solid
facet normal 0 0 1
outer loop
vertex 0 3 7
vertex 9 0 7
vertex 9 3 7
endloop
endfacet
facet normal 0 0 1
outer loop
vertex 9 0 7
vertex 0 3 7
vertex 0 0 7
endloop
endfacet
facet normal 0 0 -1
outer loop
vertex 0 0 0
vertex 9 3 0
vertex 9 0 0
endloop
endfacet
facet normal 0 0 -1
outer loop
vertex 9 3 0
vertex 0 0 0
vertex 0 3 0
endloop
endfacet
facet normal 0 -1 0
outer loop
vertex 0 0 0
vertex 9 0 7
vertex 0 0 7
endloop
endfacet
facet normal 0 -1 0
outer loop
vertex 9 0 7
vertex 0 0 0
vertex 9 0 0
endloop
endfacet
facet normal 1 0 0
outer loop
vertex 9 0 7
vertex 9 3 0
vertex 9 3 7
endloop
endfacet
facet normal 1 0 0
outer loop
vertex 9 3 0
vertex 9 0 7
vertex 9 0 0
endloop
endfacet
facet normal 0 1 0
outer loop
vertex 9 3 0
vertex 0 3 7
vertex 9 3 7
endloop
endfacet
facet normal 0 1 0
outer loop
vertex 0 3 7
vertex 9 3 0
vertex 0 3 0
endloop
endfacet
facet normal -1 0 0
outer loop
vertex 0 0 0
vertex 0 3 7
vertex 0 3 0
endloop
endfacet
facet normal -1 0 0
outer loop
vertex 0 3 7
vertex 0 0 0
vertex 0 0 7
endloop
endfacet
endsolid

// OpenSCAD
// Generated by SolidPython 1.0.1 on 2020-07-29 00:46:55


cube(size = [9, 3, 7]);
/***********************************************
*********      SolidPython code:      **********
************************************************
 
# import packages: SolidPython
from solid import *
from solid.utils import *
from itertools import chain, combinations, permutations


class Resize:

    def __init__(self, scad_file):
        self.scad_file = scad_file
        #self.scad_file = import_scad(scad_file)
        # cone/cylinder param:
        self.r1 = 0
        self.r2 = 0
        self.h = 0
        # rectangular prism param:
        self.w = 0
        self.l = 0
        # ellipse param:
        self.r = 0

    # import OpenScad code (file name corresponds to shape)


    # classify shape + parameters
    def assign(self, param1, param2, param3):
        if self.scad_file == 'cone.scad':
            self.r1 = param1
            self.r2 = param2
            self.h = param3
        elif self.scad_file == 'cylinder.scad':
            self.r1 = param1
            self.r2 = param2
            self.h = param3
        elif self.scad_file == 'rectangularPrism.scad':
            self.h = param1
            self.l = param2
            self.w = param3
        else:
            self.r = param1
            self.h = param2

    # resize parameters
    def iterate(self):
        x = range(3, 20, 2)
        i = 1
        if self.scad_file == 'cone.scad':
            tempList = list(permutations(x, 2))
            for temp in tempList:
                param1 = temp[0]
                param2 = temp[1]
                filepath = 'produced_scad_files/' + 'cone' + str(param1) + '_' + str(param2) + '_' + '.scad'
                scad_render_to_file(cylinder(h=param1, r1=param2, r2=0), filepath)

        elif self.scad_file == 'cylinder.scad':
            tempList = list(permutations(x, 3))
            for temp in tempList:
                param1 = temp[0]
                param2 = temp[1]
                filepath = 'produced_scad_files/' + 'cylinder' + str(param1) + '_' + str(param2) + '_' + '.scad'
                scad_render_to_file(cylinder(h=param1, r1=param2, r2=param2), filepath)

        elif self.scad_file == 'rectangularPrism.scad':
            tempList = list(permutations(x, 3))
            for temp in tempList:
                param1 = temp[0]
                param2 = temp[1]
                param3 = temp[2]
                filepath = 'produced_scad_files/' + 'rectangularPrism' + str(param1) + '_' + str(param2) + '_' + str(
                    param3) + '.scad'
                scad_render_to_file(cube(size=(param1, param2, param3)), filepath)

        elif self.scad_file == 'ellipse.scad':
            tempList = list(permutations(x, 4))
            for temp in tempList:
                param1 = temp[0]
                param2 = temp[1]
                param3 = temp[2]
                param4 = temp[3]
                filepath = 'produced_scad_files/' + 'ellipse' + str(param1) + '_' + str(param2) + '_' + str(param3) + '_' + str(param4) + '.scad'
                scad_render_to_file(scale([param1, param2, param3])(sphere(r=param4)), filepath)

    def render_to_scadfile(self):
        scad_render_to_file(scad, 'example.scad') 
 
************************************************/
